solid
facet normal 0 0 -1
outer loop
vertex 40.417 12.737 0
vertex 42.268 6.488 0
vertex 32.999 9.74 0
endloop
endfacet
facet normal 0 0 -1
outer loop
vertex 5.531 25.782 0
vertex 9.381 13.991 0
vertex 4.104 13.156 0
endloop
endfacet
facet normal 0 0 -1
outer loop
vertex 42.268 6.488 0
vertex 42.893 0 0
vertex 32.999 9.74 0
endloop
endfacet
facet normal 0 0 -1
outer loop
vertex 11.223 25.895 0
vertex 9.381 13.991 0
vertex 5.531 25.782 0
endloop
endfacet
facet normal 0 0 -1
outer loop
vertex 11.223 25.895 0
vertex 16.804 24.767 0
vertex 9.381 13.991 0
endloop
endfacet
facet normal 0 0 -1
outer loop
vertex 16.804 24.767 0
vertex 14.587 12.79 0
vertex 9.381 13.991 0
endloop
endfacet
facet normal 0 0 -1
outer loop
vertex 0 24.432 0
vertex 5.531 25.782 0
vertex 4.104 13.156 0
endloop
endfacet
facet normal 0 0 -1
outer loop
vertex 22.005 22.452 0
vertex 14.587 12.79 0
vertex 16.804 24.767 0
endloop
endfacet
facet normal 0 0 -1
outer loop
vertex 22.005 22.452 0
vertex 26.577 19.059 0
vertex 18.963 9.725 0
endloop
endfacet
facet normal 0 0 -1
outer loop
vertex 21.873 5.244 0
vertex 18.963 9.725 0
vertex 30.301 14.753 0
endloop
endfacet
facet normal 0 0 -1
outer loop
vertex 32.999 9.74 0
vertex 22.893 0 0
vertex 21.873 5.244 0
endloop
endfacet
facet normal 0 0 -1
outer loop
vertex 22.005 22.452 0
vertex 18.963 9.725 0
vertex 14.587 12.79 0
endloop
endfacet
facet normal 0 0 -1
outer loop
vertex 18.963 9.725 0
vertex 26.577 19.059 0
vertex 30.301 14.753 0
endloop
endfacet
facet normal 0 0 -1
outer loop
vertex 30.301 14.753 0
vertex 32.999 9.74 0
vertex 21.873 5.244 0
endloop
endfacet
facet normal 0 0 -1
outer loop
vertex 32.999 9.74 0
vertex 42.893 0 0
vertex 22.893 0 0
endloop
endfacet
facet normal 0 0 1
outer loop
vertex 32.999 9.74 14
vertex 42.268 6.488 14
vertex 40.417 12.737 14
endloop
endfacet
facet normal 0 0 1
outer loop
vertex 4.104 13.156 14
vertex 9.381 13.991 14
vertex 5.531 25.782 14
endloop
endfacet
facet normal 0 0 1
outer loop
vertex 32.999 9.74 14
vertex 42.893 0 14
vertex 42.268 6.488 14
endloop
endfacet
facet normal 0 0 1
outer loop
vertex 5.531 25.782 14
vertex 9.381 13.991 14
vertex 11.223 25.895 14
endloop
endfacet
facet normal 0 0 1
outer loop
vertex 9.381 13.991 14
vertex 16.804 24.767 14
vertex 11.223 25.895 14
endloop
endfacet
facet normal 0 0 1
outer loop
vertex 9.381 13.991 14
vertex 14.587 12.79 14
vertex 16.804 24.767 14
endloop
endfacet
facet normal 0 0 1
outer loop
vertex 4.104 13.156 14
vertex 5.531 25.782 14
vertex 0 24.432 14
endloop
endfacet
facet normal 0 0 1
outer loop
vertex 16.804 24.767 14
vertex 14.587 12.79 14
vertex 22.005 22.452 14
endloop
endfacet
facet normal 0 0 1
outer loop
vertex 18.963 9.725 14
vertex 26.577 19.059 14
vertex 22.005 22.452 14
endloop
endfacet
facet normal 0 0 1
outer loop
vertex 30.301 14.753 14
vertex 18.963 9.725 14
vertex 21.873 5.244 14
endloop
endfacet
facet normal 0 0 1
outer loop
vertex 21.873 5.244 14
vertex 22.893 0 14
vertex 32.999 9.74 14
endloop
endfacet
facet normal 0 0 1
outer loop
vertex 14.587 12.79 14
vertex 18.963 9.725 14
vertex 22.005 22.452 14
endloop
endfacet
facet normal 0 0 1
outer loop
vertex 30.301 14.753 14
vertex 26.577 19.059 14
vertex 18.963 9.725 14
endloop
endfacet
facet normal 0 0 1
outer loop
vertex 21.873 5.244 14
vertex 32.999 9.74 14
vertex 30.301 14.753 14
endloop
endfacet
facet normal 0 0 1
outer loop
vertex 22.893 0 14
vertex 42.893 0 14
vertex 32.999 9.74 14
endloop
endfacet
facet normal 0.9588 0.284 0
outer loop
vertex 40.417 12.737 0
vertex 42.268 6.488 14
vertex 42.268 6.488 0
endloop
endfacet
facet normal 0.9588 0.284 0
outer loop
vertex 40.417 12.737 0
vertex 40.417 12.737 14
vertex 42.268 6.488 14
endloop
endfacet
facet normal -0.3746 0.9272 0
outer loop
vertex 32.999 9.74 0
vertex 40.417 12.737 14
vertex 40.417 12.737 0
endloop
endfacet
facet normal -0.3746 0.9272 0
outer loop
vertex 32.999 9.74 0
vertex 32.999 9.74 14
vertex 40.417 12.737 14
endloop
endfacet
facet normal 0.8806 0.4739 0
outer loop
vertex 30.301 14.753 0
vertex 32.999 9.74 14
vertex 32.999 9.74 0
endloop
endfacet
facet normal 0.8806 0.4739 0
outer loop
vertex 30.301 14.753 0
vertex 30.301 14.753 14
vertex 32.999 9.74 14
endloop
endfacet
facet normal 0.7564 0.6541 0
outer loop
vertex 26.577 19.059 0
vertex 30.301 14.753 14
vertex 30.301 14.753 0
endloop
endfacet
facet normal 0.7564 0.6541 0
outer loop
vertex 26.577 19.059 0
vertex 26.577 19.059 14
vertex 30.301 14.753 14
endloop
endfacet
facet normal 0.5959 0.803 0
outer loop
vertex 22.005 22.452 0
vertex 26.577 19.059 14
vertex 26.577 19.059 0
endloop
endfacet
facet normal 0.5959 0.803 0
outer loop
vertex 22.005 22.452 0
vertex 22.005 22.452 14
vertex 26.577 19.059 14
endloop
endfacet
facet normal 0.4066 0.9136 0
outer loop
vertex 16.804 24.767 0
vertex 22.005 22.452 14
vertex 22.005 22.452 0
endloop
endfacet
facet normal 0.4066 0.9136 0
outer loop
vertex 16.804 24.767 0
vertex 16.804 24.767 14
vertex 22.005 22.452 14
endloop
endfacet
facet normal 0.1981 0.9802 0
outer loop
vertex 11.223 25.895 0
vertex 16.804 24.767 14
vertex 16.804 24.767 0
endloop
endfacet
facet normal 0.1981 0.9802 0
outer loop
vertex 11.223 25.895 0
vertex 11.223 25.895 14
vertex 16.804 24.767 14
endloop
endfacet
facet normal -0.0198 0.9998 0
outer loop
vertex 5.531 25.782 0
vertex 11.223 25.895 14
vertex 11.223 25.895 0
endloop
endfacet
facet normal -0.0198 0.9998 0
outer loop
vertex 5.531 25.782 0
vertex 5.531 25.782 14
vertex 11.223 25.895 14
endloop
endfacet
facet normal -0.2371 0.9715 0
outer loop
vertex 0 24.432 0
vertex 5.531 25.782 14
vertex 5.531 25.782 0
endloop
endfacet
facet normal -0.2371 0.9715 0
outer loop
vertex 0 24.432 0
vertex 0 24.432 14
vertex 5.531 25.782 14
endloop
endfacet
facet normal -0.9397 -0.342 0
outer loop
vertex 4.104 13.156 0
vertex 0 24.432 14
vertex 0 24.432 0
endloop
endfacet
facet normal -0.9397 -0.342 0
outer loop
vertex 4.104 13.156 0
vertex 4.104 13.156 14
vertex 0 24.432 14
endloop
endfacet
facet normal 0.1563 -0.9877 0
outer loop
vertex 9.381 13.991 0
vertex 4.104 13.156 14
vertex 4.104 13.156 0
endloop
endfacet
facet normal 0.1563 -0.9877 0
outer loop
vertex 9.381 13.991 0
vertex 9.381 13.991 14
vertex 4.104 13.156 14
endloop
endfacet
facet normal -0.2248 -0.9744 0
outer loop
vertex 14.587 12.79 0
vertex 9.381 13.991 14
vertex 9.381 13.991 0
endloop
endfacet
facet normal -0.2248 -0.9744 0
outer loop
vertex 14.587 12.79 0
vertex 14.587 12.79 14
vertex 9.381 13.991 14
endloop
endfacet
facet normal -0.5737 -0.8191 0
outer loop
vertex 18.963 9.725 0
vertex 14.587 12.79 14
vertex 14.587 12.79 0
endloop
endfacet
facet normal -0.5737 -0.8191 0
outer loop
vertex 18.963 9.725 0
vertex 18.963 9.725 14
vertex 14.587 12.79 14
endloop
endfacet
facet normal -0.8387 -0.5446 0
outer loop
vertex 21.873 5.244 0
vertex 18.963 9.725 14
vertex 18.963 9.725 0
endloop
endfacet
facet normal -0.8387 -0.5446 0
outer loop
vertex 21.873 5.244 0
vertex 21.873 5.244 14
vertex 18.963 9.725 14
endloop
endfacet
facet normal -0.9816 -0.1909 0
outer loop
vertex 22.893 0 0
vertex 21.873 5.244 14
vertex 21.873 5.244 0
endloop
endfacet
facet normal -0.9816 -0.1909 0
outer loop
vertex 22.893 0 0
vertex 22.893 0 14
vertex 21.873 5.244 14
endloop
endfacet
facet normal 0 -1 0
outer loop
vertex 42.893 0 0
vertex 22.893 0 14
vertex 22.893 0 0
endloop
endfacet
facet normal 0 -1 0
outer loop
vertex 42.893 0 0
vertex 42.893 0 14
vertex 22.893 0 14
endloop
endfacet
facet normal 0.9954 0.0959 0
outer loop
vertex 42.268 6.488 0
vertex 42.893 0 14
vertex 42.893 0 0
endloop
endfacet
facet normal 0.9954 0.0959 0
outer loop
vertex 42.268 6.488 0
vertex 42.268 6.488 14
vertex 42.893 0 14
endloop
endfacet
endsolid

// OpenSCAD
$fn = 32;

// ----------------------------------------------------------------------
// Arc stop: segment, 14 mm thick
// ----------------------------------------------------------------------

// --- parameters (mm) ---
profile_height = 14;      // extrusion height
profile_points = 17;      // points of the closed outline

profile = [[42.893, 0], [42.268, 6.488], [40.417, 12.737], [32.999, 9.74], [30.301, 14.753], [26.577, 19.059], [22.005, 22.452], [16.804, 24.767], [11.223, 25.895], [5.531, 25.782], [0, 24.432], [4.104, 13.156], [9.381, 13.991], [14.587, 12.79], [18.963, 9.725], [21.873, 5.244], [22.893, 0]];  // single closed polygon, 17 points, counter clockwise

// --- the one profile operation ---
linear_extrude(height = profile_height) polygon(points = profile);
